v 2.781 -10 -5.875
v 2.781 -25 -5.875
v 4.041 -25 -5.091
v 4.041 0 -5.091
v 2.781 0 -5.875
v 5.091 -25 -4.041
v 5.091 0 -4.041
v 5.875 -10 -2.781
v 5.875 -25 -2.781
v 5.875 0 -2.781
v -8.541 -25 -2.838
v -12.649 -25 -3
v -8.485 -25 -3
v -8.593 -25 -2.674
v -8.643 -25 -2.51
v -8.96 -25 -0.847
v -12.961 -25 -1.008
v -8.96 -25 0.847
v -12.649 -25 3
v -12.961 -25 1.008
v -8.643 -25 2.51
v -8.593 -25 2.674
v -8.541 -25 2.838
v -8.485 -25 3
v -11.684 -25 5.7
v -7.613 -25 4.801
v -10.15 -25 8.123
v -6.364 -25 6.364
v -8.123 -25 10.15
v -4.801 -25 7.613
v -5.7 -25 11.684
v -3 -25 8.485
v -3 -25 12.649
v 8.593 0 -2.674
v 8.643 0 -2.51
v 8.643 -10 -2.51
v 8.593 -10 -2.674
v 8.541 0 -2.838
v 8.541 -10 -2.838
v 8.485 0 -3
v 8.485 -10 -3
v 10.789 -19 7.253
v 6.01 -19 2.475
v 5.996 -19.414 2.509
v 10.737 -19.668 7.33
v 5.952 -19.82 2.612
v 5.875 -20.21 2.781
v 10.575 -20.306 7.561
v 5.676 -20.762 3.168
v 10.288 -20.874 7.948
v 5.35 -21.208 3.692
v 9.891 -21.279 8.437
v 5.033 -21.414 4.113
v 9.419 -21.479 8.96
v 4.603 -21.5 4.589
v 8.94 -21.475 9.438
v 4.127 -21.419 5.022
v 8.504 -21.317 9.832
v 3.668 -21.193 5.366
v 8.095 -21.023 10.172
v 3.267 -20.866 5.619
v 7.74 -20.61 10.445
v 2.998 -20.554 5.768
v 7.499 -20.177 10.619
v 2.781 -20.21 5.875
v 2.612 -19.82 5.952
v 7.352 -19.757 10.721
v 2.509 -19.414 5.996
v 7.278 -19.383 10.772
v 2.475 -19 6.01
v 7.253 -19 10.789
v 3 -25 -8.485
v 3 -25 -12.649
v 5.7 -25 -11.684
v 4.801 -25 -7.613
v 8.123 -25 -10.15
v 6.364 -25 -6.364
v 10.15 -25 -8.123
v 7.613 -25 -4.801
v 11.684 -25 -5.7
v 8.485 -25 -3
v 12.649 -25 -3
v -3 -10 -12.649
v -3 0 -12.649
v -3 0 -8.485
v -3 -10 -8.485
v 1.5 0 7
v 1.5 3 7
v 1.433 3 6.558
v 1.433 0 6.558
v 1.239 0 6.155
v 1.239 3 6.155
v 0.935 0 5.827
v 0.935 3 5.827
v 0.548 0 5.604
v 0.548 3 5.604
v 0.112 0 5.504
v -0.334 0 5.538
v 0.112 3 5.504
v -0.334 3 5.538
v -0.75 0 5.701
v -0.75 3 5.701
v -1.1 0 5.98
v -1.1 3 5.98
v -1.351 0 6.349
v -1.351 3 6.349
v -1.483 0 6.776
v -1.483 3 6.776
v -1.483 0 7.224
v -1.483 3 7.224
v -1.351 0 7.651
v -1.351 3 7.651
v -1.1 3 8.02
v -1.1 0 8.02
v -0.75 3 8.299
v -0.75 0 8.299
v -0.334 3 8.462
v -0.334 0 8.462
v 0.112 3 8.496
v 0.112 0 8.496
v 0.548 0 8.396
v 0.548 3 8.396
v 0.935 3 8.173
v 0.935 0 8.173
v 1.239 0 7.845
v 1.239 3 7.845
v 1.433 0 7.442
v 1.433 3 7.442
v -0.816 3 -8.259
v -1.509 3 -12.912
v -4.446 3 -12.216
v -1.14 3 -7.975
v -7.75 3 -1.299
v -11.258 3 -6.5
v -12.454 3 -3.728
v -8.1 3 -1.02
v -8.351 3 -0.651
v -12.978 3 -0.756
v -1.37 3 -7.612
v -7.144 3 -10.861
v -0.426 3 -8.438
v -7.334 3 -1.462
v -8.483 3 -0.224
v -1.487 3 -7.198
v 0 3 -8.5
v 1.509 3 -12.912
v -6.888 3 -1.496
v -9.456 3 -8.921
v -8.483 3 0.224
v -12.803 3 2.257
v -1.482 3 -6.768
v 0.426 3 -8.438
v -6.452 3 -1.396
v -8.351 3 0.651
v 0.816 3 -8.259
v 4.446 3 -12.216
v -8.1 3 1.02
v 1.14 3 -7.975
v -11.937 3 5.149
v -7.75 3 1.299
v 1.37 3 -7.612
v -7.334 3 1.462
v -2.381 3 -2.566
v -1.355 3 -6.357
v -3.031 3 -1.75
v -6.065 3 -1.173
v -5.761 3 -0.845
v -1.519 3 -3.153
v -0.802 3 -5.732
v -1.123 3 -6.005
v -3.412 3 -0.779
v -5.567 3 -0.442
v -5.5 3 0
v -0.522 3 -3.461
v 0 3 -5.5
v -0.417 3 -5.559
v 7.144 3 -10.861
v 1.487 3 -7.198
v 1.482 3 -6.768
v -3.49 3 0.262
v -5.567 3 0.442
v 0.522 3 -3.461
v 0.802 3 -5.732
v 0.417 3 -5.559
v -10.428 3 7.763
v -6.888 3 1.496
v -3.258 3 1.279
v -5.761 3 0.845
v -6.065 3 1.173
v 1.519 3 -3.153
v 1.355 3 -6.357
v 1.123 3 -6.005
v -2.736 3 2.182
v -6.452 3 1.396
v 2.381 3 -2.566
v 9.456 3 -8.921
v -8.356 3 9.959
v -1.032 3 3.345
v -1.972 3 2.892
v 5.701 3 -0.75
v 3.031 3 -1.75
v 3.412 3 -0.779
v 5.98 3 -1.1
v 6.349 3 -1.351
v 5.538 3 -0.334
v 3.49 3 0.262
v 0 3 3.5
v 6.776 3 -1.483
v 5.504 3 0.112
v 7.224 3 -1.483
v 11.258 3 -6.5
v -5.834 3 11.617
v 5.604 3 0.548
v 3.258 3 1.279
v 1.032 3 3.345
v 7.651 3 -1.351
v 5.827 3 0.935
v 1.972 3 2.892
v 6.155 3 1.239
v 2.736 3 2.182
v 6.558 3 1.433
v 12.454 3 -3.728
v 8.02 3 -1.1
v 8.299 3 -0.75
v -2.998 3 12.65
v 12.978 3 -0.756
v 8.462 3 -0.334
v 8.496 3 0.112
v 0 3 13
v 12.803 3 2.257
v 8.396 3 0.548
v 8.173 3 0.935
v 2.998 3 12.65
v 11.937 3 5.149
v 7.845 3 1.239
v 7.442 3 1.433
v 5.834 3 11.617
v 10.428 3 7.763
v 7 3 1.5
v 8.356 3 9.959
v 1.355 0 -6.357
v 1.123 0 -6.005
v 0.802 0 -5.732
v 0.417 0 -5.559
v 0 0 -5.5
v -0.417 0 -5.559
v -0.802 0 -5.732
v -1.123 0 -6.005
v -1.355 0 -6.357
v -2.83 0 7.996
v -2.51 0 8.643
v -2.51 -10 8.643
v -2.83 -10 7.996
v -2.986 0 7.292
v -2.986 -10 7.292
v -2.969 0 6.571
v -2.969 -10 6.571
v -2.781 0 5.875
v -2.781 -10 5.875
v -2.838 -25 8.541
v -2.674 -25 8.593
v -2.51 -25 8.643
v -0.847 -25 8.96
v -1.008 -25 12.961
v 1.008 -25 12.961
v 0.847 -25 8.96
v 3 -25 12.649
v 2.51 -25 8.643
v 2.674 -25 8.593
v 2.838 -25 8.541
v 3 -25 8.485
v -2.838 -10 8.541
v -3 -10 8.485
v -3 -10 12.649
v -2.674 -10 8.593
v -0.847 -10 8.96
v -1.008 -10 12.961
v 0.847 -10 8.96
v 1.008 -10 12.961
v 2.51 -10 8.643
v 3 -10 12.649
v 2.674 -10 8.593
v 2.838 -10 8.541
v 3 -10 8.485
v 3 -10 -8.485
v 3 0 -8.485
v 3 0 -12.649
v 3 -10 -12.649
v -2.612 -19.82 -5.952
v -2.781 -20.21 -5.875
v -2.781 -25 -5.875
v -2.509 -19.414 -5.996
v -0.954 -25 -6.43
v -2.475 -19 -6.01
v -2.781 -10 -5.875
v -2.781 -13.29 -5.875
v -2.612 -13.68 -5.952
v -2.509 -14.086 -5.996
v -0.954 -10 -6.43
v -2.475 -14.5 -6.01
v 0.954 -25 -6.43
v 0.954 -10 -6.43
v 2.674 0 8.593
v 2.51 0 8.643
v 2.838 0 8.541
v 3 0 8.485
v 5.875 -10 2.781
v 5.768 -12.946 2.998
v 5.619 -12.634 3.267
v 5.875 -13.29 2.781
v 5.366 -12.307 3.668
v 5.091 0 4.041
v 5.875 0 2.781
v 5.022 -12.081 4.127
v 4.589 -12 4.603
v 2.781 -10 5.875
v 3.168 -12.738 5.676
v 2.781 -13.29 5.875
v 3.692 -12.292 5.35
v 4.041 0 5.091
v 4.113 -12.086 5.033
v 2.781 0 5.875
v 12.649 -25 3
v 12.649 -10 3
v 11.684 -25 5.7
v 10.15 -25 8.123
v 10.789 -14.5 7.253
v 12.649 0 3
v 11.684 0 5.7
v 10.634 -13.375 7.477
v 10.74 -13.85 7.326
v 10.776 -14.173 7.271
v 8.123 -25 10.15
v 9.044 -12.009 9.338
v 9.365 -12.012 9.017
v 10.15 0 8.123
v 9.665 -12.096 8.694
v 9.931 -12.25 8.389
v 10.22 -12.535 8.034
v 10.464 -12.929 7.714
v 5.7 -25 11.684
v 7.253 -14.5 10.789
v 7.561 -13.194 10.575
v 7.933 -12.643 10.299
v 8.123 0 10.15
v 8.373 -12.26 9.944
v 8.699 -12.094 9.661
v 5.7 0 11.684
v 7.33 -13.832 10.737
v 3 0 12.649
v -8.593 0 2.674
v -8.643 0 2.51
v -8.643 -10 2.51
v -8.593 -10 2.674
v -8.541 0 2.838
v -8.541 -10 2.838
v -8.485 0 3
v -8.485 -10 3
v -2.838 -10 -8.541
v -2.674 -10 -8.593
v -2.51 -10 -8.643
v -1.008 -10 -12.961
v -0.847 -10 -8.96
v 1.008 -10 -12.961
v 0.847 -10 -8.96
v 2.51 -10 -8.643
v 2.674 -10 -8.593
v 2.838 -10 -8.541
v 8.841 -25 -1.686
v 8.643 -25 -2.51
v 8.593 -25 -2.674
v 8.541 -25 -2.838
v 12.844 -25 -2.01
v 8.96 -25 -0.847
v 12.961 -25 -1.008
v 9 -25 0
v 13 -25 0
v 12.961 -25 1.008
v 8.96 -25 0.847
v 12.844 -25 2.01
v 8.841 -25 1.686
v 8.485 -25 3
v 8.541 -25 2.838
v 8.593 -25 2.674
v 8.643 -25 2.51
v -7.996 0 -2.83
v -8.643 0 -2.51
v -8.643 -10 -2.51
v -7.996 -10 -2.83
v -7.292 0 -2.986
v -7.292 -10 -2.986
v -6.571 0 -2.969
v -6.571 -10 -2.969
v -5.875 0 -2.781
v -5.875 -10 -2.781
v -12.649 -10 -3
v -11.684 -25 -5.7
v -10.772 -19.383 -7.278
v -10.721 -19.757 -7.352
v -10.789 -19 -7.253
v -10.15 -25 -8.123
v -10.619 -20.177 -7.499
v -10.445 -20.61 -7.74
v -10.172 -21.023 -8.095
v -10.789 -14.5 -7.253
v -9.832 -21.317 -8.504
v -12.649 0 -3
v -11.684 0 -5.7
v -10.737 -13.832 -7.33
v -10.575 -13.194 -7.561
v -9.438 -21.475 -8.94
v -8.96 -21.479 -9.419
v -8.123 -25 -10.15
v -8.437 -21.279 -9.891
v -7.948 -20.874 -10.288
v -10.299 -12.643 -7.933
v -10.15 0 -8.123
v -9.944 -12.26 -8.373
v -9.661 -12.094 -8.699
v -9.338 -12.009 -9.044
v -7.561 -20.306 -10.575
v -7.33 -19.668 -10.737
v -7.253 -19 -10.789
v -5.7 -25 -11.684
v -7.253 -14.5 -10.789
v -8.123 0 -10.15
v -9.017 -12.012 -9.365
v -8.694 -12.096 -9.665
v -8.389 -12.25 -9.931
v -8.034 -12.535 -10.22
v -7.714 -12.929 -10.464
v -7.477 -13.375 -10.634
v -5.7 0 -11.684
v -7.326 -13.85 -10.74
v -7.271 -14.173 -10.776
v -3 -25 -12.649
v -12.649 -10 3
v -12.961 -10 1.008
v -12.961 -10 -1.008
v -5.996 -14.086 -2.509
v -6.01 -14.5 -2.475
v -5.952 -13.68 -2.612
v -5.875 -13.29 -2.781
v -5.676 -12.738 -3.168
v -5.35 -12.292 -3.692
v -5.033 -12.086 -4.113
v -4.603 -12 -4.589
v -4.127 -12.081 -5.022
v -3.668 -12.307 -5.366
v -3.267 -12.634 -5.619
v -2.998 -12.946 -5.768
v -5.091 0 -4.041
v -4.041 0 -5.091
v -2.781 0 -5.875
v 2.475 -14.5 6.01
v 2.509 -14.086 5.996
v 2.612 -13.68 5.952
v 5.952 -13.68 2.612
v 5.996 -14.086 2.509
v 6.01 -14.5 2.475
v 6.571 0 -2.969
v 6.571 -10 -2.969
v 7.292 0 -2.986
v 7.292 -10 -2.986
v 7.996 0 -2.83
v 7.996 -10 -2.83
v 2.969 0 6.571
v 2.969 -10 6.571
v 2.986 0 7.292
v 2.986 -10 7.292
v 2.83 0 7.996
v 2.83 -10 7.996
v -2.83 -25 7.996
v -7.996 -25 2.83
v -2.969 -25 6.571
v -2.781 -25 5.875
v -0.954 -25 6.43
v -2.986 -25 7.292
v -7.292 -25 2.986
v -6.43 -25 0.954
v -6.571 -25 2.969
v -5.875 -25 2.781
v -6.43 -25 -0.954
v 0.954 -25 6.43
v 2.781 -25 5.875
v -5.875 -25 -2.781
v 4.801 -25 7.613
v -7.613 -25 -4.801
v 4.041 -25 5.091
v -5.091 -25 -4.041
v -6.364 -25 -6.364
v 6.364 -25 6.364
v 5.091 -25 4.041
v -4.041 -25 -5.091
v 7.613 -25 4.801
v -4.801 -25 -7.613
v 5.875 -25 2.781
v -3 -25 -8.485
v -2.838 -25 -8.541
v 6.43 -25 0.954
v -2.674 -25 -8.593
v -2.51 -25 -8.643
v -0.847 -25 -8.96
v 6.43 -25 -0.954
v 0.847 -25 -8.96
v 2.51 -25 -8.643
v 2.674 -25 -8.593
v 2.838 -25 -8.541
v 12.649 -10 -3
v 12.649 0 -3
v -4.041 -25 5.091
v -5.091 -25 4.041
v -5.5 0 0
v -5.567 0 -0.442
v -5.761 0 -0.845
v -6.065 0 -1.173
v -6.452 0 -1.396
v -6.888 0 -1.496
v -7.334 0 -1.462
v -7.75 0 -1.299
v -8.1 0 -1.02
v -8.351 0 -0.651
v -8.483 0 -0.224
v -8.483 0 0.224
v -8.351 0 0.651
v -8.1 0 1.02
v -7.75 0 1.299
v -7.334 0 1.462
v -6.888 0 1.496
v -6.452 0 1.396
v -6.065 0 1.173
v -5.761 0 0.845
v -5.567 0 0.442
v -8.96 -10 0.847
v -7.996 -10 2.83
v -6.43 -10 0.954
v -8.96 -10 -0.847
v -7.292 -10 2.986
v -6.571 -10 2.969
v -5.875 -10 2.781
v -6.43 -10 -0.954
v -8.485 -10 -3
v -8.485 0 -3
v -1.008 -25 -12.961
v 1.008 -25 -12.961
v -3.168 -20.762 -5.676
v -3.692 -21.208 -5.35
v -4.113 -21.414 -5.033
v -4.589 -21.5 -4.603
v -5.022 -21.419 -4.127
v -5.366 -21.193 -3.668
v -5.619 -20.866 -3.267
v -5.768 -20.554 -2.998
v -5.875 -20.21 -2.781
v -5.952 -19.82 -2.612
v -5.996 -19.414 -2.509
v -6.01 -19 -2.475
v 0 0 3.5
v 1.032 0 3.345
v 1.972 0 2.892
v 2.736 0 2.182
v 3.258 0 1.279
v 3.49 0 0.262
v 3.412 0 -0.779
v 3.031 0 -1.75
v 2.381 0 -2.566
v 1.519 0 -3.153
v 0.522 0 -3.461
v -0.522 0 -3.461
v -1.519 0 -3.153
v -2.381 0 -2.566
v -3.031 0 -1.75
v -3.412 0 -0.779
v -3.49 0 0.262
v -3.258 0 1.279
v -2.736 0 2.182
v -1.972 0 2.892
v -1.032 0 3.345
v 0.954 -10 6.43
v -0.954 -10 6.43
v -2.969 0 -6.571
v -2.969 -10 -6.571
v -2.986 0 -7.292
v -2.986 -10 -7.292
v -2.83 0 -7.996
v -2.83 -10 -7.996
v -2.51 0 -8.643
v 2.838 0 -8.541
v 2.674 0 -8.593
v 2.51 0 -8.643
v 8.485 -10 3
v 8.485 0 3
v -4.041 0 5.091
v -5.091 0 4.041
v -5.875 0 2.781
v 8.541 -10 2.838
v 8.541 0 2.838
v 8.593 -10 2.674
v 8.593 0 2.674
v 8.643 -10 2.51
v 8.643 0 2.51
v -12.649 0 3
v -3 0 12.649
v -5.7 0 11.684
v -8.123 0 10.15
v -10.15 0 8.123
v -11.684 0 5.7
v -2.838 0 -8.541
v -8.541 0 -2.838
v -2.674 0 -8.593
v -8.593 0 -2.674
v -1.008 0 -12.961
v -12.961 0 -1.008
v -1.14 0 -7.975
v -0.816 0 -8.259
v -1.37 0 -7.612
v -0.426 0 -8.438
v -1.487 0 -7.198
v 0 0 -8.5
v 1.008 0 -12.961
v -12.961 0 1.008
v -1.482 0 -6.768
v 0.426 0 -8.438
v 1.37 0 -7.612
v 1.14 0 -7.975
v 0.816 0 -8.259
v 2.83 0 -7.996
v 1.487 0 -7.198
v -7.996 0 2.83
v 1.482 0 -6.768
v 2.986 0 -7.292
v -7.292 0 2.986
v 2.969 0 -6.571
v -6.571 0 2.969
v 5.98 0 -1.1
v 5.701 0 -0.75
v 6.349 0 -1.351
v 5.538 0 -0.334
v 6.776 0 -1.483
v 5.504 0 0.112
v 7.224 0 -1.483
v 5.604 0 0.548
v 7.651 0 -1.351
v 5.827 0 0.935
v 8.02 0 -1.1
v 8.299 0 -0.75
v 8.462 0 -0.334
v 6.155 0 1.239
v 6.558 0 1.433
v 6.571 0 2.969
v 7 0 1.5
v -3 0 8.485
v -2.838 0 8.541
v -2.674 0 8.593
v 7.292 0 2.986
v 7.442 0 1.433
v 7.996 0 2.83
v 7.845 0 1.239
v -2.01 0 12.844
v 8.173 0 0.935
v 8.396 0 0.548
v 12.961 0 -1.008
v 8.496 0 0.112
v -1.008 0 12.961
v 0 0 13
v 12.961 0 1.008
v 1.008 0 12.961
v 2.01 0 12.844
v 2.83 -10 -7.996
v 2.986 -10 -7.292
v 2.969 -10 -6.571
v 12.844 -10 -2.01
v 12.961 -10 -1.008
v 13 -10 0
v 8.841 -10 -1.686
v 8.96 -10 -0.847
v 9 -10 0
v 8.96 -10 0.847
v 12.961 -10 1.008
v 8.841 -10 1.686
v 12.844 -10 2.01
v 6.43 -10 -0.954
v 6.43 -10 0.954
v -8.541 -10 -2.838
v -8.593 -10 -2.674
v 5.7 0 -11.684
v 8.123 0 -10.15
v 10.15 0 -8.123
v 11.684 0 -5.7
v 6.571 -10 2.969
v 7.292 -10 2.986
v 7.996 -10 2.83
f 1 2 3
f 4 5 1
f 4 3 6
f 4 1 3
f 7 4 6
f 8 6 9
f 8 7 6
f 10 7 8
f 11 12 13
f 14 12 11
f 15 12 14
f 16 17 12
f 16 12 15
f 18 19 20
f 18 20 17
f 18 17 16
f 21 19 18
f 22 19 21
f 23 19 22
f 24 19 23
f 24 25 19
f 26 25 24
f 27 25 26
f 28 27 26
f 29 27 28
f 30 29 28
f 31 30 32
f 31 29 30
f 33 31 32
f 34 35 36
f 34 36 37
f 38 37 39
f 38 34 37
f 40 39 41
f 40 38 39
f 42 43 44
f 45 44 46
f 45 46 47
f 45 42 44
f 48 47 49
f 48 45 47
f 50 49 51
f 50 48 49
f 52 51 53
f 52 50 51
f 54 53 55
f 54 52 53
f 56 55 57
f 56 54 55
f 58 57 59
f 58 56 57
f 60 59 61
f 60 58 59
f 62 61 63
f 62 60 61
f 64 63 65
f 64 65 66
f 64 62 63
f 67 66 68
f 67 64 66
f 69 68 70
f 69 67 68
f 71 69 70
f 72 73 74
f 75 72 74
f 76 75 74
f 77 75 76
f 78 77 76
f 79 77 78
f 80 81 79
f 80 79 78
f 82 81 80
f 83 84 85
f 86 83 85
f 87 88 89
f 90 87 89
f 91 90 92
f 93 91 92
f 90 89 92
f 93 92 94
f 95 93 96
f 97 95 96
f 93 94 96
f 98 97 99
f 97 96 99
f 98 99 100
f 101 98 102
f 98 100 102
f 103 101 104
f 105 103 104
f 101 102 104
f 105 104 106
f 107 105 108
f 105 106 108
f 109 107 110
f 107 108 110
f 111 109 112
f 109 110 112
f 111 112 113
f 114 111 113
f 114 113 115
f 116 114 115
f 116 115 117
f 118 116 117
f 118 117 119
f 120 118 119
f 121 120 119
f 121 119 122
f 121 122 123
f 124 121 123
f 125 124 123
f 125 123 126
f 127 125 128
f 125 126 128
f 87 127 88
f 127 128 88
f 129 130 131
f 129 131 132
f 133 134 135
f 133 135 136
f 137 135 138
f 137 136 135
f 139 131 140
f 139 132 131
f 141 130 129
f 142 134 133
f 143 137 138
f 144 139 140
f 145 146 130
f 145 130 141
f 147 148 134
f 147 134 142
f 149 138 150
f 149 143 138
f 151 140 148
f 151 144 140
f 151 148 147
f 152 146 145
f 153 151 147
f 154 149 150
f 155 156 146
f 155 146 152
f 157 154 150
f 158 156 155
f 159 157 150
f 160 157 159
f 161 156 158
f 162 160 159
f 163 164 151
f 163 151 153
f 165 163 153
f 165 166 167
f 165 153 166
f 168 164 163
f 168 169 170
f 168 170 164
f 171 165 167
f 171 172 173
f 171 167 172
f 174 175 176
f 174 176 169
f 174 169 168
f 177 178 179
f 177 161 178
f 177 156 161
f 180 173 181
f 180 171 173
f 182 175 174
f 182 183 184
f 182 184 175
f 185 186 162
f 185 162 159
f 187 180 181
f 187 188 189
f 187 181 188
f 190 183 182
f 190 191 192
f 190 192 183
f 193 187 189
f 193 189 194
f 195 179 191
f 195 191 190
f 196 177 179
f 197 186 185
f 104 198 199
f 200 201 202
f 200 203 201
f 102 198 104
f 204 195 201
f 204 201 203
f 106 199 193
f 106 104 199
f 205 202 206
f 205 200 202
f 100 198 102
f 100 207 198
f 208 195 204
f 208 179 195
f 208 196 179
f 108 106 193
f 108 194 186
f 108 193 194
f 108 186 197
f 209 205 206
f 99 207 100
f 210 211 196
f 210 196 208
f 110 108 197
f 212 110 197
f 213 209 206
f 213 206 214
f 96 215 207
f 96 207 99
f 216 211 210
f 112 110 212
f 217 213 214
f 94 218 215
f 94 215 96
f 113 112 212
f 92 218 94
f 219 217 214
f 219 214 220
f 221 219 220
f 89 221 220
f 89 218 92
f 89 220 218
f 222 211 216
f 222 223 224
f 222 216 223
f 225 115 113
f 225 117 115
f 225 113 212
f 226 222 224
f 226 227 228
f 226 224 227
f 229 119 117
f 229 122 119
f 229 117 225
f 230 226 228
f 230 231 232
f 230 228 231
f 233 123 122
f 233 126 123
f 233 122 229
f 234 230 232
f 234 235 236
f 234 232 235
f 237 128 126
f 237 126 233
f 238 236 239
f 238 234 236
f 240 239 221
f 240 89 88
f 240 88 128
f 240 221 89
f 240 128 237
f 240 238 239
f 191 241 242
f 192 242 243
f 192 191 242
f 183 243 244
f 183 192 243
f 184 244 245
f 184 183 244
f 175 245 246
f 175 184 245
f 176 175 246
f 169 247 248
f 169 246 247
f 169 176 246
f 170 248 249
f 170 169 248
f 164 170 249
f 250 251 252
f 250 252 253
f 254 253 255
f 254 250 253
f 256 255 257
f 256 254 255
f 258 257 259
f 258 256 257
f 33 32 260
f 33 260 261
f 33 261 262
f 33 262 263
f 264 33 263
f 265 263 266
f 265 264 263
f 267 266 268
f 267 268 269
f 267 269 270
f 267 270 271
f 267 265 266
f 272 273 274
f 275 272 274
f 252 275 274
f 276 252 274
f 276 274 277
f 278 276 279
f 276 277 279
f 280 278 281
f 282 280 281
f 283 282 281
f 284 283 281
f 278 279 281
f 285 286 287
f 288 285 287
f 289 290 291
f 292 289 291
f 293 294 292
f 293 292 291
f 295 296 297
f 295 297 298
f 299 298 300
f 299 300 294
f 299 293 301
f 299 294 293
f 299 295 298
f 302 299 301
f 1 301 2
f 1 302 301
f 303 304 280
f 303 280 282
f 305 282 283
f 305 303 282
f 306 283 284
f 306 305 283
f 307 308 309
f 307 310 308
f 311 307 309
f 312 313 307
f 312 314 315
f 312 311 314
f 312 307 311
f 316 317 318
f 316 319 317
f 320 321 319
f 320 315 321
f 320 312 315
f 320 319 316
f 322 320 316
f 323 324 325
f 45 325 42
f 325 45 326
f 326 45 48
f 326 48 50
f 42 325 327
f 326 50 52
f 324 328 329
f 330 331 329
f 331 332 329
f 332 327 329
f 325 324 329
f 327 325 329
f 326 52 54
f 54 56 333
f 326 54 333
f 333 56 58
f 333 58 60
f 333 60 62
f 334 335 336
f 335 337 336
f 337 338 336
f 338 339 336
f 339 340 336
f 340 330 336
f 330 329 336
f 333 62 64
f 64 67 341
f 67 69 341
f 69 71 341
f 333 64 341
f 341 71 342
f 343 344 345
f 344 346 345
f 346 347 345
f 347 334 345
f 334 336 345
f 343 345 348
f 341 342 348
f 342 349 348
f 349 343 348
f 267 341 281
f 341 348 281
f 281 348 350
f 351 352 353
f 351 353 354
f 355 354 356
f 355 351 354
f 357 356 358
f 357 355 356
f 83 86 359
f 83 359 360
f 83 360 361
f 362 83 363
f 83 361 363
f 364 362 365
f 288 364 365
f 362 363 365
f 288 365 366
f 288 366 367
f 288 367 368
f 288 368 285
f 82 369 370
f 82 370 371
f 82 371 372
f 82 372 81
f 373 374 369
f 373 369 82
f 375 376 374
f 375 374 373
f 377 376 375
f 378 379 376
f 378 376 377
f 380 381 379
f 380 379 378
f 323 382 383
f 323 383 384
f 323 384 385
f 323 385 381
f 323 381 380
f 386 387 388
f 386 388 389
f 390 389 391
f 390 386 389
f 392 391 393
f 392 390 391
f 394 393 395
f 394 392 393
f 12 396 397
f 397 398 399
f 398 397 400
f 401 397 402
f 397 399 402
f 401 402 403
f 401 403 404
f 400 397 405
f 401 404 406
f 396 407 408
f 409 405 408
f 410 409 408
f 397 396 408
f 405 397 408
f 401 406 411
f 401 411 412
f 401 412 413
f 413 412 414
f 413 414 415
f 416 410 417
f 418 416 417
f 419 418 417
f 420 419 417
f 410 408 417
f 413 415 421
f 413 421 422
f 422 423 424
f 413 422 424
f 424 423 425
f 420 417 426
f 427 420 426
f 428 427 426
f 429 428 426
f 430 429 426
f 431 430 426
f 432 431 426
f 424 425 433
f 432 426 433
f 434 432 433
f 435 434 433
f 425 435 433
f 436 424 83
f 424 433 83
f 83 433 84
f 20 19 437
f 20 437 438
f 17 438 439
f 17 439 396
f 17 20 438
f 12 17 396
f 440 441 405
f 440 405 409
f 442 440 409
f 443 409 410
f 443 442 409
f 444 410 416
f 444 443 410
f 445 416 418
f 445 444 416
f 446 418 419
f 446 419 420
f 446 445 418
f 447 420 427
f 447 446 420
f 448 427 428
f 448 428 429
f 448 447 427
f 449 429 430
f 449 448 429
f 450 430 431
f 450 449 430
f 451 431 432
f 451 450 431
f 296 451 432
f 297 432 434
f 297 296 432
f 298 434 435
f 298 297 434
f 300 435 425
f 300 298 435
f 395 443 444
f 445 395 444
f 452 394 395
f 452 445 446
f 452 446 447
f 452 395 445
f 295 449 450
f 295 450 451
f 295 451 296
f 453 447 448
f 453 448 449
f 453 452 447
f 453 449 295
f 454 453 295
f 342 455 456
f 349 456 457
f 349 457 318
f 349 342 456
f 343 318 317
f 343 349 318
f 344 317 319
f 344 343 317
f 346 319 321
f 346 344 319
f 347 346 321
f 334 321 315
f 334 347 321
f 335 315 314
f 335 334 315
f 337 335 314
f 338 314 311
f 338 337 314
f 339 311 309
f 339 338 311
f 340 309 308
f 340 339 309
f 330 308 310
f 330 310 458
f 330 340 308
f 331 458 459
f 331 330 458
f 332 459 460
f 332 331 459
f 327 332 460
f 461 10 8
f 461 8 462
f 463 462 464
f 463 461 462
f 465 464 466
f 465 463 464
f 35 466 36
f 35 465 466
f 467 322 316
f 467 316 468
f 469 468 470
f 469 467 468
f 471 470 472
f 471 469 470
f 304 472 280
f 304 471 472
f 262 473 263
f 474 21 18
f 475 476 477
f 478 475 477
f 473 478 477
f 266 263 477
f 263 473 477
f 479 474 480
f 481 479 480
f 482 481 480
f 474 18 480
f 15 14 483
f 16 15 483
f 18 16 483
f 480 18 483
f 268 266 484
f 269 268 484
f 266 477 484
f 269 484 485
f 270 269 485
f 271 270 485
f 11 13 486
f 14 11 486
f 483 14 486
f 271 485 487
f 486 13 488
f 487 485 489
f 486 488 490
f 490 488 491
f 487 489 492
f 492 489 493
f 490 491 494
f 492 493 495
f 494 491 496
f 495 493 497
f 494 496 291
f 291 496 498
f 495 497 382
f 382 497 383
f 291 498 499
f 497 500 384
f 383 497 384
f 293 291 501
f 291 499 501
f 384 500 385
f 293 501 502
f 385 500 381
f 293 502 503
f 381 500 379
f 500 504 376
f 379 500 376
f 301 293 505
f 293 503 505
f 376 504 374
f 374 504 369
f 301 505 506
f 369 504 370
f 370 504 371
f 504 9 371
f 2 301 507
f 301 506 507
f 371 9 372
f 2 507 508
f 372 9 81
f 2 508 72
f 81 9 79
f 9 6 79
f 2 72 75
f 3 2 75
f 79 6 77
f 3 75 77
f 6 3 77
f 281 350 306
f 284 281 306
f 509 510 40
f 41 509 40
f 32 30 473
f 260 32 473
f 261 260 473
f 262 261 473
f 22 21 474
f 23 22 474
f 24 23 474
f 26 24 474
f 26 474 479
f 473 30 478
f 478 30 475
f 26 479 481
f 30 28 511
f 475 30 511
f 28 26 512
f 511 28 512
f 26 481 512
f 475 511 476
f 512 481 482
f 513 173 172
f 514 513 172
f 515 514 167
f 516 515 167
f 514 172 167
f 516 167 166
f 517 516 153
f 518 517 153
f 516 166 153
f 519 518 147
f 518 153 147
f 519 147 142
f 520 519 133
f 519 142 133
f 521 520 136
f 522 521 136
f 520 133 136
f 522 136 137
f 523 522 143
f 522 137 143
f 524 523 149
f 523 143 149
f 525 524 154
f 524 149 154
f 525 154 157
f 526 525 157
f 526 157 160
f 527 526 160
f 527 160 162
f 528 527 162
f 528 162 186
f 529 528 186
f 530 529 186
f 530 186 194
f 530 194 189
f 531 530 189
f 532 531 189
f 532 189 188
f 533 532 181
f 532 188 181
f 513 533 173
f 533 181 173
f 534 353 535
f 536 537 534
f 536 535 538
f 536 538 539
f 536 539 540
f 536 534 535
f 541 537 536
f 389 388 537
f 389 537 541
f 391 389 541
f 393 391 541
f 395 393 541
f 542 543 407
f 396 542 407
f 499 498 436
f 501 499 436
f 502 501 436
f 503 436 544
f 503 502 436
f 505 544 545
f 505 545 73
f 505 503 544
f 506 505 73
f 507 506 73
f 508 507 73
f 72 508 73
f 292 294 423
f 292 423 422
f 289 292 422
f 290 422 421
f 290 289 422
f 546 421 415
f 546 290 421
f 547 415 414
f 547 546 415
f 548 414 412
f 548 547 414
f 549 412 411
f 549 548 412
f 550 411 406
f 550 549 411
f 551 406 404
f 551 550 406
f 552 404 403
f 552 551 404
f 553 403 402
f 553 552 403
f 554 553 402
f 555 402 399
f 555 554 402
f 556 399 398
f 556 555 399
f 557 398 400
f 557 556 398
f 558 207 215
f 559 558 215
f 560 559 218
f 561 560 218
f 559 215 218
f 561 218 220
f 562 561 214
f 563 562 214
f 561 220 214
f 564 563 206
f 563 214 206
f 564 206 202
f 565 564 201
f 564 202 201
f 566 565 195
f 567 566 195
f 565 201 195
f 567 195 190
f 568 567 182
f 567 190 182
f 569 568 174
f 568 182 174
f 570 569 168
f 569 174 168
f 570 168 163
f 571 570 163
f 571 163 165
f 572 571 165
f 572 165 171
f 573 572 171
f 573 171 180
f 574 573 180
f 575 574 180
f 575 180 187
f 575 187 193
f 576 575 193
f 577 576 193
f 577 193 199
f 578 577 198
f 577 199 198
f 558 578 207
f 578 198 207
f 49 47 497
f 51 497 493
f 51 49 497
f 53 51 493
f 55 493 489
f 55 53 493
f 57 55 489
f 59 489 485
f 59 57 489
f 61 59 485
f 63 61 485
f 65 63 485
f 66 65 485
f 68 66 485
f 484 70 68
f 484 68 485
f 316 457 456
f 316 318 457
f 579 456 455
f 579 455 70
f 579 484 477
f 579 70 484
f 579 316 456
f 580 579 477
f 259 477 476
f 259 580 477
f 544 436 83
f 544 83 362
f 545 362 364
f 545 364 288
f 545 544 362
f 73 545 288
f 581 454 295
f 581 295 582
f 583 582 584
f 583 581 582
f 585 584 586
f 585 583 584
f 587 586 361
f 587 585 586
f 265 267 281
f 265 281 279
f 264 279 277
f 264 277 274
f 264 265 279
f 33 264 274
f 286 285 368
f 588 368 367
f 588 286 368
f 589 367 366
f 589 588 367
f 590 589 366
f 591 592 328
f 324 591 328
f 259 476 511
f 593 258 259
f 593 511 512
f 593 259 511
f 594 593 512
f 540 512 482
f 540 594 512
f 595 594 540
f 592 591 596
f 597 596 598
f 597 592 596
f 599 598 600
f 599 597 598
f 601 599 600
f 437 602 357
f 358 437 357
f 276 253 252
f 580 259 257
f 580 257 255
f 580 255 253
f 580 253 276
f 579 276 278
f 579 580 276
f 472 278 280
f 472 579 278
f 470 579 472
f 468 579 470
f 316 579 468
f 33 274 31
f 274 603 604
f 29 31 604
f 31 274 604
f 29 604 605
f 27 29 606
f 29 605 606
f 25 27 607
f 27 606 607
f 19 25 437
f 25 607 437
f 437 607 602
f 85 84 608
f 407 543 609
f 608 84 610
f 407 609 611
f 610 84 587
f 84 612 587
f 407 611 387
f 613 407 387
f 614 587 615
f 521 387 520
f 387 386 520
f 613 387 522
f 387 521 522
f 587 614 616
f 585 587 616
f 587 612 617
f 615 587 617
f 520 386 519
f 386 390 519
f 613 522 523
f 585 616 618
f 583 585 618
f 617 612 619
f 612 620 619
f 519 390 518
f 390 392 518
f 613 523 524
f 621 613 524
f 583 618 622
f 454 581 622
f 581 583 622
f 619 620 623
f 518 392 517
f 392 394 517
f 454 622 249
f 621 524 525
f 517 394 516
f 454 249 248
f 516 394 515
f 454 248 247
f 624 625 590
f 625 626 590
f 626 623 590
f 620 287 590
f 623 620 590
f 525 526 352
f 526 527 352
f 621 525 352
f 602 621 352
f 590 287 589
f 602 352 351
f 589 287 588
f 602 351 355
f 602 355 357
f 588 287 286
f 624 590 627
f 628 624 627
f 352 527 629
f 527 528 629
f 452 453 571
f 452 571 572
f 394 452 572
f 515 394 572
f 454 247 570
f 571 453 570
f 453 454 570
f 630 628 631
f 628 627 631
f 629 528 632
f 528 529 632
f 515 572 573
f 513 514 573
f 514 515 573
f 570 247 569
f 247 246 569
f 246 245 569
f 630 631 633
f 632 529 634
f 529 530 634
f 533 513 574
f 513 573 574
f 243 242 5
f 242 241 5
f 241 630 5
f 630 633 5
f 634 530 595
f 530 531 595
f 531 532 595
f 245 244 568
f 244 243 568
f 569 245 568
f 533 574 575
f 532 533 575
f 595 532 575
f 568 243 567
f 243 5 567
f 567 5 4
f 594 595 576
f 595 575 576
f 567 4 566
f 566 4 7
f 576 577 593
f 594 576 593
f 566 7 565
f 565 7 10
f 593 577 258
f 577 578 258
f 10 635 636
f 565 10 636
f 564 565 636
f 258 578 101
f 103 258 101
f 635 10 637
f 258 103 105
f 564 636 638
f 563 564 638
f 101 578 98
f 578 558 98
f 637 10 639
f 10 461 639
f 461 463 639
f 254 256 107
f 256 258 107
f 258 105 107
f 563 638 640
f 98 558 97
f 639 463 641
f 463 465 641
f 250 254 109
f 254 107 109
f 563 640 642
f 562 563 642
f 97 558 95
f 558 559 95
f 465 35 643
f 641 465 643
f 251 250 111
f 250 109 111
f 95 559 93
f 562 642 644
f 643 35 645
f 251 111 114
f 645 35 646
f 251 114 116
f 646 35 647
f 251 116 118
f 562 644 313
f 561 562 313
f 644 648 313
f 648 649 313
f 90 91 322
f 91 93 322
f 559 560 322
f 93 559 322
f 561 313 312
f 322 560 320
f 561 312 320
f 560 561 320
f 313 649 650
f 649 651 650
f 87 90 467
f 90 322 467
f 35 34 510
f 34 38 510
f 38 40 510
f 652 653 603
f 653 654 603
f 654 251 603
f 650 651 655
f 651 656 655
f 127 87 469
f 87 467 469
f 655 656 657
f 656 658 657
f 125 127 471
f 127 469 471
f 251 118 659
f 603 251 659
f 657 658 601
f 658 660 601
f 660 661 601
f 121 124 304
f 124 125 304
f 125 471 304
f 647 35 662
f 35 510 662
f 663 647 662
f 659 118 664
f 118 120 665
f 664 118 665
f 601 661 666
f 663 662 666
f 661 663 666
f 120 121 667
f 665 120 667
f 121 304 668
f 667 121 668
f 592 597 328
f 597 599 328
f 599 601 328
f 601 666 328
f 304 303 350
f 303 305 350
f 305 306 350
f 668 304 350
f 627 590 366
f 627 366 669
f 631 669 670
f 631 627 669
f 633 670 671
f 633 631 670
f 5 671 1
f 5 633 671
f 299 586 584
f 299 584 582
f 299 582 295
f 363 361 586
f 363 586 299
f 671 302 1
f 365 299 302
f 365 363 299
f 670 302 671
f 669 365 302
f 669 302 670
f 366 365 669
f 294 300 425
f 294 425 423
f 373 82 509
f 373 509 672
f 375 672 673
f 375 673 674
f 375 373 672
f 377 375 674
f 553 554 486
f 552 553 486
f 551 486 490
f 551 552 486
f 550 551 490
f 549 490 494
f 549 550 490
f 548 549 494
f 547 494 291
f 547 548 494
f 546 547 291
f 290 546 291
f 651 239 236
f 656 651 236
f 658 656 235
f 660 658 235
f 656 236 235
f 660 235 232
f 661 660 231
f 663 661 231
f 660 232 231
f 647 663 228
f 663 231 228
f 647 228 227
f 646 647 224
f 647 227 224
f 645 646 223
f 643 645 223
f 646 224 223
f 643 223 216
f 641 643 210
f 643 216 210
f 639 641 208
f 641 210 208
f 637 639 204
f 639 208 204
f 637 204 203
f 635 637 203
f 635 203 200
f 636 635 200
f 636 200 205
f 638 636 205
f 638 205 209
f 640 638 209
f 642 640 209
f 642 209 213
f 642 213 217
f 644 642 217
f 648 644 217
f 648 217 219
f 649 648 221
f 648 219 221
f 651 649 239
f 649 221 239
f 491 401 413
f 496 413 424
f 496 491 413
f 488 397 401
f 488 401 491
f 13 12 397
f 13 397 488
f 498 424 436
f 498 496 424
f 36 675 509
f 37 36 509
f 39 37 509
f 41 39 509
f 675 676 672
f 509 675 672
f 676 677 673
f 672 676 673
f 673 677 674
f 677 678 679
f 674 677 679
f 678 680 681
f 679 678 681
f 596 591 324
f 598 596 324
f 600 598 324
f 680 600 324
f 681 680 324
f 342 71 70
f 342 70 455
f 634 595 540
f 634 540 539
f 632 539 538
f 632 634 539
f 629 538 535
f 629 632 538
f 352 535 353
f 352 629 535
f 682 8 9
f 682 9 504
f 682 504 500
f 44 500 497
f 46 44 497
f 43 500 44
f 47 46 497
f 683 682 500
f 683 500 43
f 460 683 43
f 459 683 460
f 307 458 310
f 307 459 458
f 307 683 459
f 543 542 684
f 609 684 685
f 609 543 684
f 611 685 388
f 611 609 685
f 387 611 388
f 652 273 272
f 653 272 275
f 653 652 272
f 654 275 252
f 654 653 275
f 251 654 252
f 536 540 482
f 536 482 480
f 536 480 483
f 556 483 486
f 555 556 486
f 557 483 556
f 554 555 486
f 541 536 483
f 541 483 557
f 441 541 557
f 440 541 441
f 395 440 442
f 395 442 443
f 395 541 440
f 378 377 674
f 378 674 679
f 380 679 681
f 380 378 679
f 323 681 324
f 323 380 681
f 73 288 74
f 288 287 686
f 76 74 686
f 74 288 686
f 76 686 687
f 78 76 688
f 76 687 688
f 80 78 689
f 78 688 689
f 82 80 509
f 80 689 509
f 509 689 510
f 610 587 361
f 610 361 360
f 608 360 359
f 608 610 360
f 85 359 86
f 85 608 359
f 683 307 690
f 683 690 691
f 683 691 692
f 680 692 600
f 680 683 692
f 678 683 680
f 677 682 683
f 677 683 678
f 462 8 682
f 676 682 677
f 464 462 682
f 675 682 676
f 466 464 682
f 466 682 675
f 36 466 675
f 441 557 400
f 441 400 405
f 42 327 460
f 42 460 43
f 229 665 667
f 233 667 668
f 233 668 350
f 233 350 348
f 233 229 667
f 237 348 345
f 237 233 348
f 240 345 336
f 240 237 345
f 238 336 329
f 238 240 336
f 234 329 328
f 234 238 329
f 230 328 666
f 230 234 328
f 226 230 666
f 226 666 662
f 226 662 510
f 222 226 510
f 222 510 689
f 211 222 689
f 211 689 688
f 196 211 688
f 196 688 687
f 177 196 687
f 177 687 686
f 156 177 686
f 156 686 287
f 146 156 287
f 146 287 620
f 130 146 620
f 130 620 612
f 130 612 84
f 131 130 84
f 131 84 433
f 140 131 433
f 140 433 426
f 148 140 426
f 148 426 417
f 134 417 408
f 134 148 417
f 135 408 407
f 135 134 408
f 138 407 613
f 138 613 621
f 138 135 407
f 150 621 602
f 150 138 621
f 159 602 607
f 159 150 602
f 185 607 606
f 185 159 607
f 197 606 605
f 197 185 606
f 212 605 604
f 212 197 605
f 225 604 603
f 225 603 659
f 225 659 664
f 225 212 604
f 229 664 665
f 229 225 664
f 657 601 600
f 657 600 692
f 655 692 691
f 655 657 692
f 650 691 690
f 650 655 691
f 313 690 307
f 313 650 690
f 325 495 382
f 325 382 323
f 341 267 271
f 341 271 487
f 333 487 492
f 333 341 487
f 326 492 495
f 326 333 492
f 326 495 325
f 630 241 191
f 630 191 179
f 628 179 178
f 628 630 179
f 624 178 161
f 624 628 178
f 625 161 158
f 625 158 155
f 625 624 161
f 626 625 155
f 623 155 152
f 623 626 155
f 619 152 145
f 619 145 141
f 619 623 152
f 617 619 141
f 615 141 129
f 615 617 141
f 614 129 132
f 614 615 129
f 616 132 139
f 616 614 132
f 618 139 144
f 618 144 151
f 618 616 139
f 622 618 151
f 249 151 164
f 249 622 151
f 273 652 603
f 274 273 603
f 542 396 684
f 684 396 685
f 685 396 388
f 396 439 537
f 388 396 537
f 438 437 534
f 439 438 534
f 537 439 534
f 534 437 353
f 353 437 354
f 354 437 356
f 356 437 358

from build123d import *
from build123d.topology import SkipClean

# Parameters (mm, degrees)
BOSS_EXTRUDE2_DEPTH     = 25
BOSS_EXTRUDE2_2_DEPTH   = 25
BOSS_EXTRUDE2_3_DEPTH   = 25
BOSS_EXTRUDE2_4_DEPTH   = 25
BOSS_EXTRUDE3_START     = 3
SKETCH1_4_R             = 13
SKETCH1_4_R_2           = 1.5
SKETCH1_4_R_3           = 3.5
BOSS_EXTRUDE3_DEPTH     = 3
SKETCH1_7_R             = 1.5
CUT_EXTRUDE2_DEPTH      = 3
BOSS_EXTRUDE4_START     = -10
BOSS_EXTRUDE4_DEPTH     = 15
BOSS_EXTRUDE6_DEPTH     = 25
BOSS_EXTRUDE7_DEPTH     = 15
CUT_EXTRUDE1_DEPTH      = 47.121315646
CUT_EXTRUDE1_DEPTH_BACK = 47.121315646


with BuildPart() as part:
    # Sketch1 → Boss-Extrude2 (new body)
    with BuildSketch(Plane(origin=(0, 0, 0), x_dir=(1, 0, 0), z_dir=(0, 1, 0))):
        with BuildLine():
            ThreePointArc((2.781074433, 5.875), (4.596194078, 4.596194078), (5.875, 2.781074433))
            ThreePointArc((5.875, 2.781074433), (7.29221482, 2.985734499), (8.642857143, 2.510183342))
            ThreePointArc((8.642857143, 2.510183342), (6.363961031, 6.363961031), (2.510183342, 8.642857143))
            ThreePointArc((2.510183342, 8.642857143), (2.985734499, 7.29221482), (2.781074433, 5.875))
        make_face()
    extrude(amount=-BOSS_EXTRUDE2_DEPTH)


with BuildPart() as body_2:
    # Sketch1 → Boss-Extrude2 2 (new body)
    with BuildSketch(Plane(origin=(0, 0, 0), x_dir=(1, 0, 0), z_dir=(0, 1, 0))):
        with BuildLine():
            ThreePointArc((8.642857143, -2.510183342), (7.29221482, -2.985734499), (5.875, -2.781074433))
            ThreePointArc((5.875, -2.781074433), (4.596194078, -4.596194078), (2.781074433, -5.875))
            ThreePointArc((2.781074433, -5.875), (2.985734499, -7.29221482), (2.510183342, -8.642857143))
            ThreePointArc((2.510183342, -8.642857143), (6.363961031, -6.363961031), (8.642857143, -2.510183342))
        make_face()
    extrude(amount=-BOSS_EXTRUDE2_2_DEPTH)


    add(part.part)  # Boss-Extrude3 merges part


with BuildPart() as body_3:
    # Sketch1 → Boss-Extrude2 3 (new body)
    with BuildSketch(Plane(origin=(0, 0, 0), x_dir=(1, 0, 0), z_dir=(0, 1, 0))):
        with BuildLine():
            ThreePointArc((-5.875, 2.781074433), (-4.596194078, 4.596194078), (-2.781074433, 5.875))
            ThreePointArc((-2.781074433, 5.875), (-2.985734499, 7.29221482), (-2.510183342, 8.642857143))
            ThreePointArc((-2.510183342, 8.642857143), (-6.363961031, 6.363961031), (-8.642857143, 2.510183342))
            ThreePointArc((-8.642857143, 2.510183342), (-7.29221482, 2.985734499), (-5.875, 2.781074433))
        make_face()
    extrude(amount=-BOSS_EXTRUDE2_3_DEPTH)


with BuildPart() as body_4:
    # Sketch1 → Boss-Extrude2 4 (new body)
    with BuildSketch(Plane(origin=(0, 0, 0), x_dir=(1, 0, 0), z_dir=(0, 1, 0))):
        with BuildLine():
            ThreePointArc((-2.510183342, -8.642857143), (-2.985734499, -7.29221482), (-2.781074433, -5.875))
            ThreePointArc((-2.781074433, -5.875), (-4.596194078, -4.596194078), (-5.875, -2.781074433))
            ThreePointArc((-5.875, -2.781074433), (-7.29221482, -2.985734499), (-8.642857143, -2.510183342))
            ThreePointArc((-8.642857143, -2.510183342), (-6.363961031, -6.363961031), (-2.510183342, -8.642857143))
        make_face()
    extrude(amount=-BOSS_EXTRUDE2_4_DEPTH)


with BuildPart() as body_2_1:
    add(body_2.part)

    add(body_3.part)  # Boss-Extrude3 merges body 3
    # Sketch1<4> → Boss-Extrude3 (add)
    with BuildSketch(Plane(origin=(0, 0, 0), x_dir=(1, 0, 0), z_dir=(0, 1, 0)).offset(BOSS_EXTRUDE3_START)):
        with Locations(Location((0, 0, 0), (0, 0, 270))):
            Circle(SKETCH1_4_R)
        with Locations(Location((7, 0, 0), (0, 0, 270))):
            Circle(SKETCH1_4_R_2, mode=Mode.SUBTRACT)
        with Locations((0, -7)):
            Circle(SKETCH1_4_R_2, mode=Mode.SUBTRACT)
        with Locations((-7, 0)):
            Circle(SKETCH1_4_R_2, mode=Mode.SUBTRACT)
        with Locations(Location((0, 0, 0), (0, 0, 270))):
            Circle(SKETCH1_4_R_3, mode=Mode.SUBTRACT)
        with BuildLine():
            ThreePointArc((1.355261854, 6.357142857), (0, 5.5), (-1.355261854, 6.357142857))
            ThreePointArc((-1.355261854, 6.357142857), (0, 6.5), (1.355261854, 6.357142857))
        make_face(mode=Mode.SUBTRACT)
    extrude(amount=-BOSS_EXTRUDE3_DEPTH)

    # Sketch1<7> → Cut-Extrude2 (cut)
    with BuildSketch(Plane(origin=(0, 0, 0), x_dir=(1, 0, 0), z_dir=(0, 1, 0))):
        with Locations(Location((0, 7, 0), (0, 0, 270))):
            Circle(SKETCH1_7_R)
    extrude(amount=CUT_EXTRUDE2_DEPTH, mode=Mode.SUBTRACT)

    # Sketch1<6> → Boss-Extrude4 (add)
    with BuildSketch(Plane(origin=(0, 0, 0), x_dir=(1, 0, 0), z_dir=(0, 1, 0)).offset(BOSS_EXTRUDE4_START)):
        with BuildLine():
            ThreePointArc((5.875, -2.781074433), (7.29221482, -2.985734499), (8.642857143, -2.510183342))
            ThreePointArc((8.642857143, -2.510183342), (9, 0), (8.642857143, 2.510183342))
            ThreePointArc((8.642857143, 2.510183342), (7.29221482, 2.985734499), (5.875, 2.781074433))
            ThreePointArc((5.875, 2.781074433), (6.5, 0), (5.875, -2.781074433))
        make_face()
        with BuildLine():
            ThreePointArc((2.781074433, 5.875), (2.985734499, 7.29221482), (2.510183342, 8.642857143))
            ThreePointArc((2.510183342, 8.642857143), (0, 9), (-2.510183342, 8.642857143))
            ThreePointArc((-2.510183342, 8.642857143), (-2.985734499, 7.29221482), (-2.781074433, 5.875))
            ThreePointArc((-2.781074433, 5.875), (0, 6.5), (2.781074433, 5.875))
        make_face()
        with BuildLine():
            ThreePointArc((2.510183342, -8.642857143), (2.985734499, -7.29221482), (2.781074433, -5.875))
            ThreePointArc((2.781074433, -5.875), (0, -6.5), (-2.781074433, -5.875))
            ThreePointArc((-2.781074433, -5.875), (-2.985734499, -7.29221482), (-2.510183342, -8.642857143))
            ThreePointArc((-2.510183342, -8.642857143), (0, -9), (2.510183342, -8.642857143))
        make_face()
        with BuildLine():
            ThreePointArc((-5.875, 2.781074433), (-7.29221482, 2.985734499), (-8.642857143, 2.510183342))
            ThreePointArc((-8.642857143, 2.510183342), (-9, 0), (-8.642857143, -2.510183342))
            ThreePointArc((-8.642857143, -2.510183342), (-7.29221482, -2.985734499), (-5.875, -2.781074433))
            ThreePointArc((-5.875, -2.781074433), (-6.5, 0), (-5.875, 2.781074433))
        make_face()
    extrude(amount=-BOSS_EXTRUDE4_DEPTH)


    with SkipClean():  # the faces are left unmerged after this step: merging them gives an invalid solid
        add(body_4.part)  # Boss-Extrude6 merges body 4
        # Sketch3 → Boss-Extrude6 (add)
        with BuildSketch(Plane.XZ):
            with BuildLine():
                Line((-8.485281374, -3), (-12.649110641, -3))
                ThreePointArc((-12.649110641, -3), (-9.192388155, -9.192388155), (-3, -12.649110641))
                Line((-3, -12.649110641), (-3, -8.485281374))
                ThreePointArc((-3, -8.485281374), (-6.363961031, -6.363961031), (-8.485281374, -3))
            make_face()
            with BuildLine():
                ThreePointArc((3, -12.649110641), (9.192388155, -9.192388155), (12.649110641, -3))
                Line((12.649110641, -3), (8.485281374, -3))
                ThreePointArc((8.485281374, -3), (6.363961031, -6.363961031), (3, -8.485281374))
                Line((3, -8.485281374), (3, -12.649110641))
            make_face()
            with BuildLine():
                ThreePointArc((12.649110641, 3), (9.192388155, 9.192388155), (3, 12.649110641))
                Line((3, 12.649110641), (3, 8.485281374))
                ThreePointArc((3, 8.485281374), (6.363961031, 6.363961031), (8.485281374, 3))
                Line((8.485281374, 3), (12.649110641, 3))
            make_face()
            with BuildLine():
                Line((-3, 8.485281374), (-3, 12.649110641))
                ThreePointArc((-3, 12.649110641), (-9.192388155, 9.192388155), (-12.649110641, 3))
                Line((-12.649110641, 3), (-8.485281374, 3))
                ThreePointArc((-8.485281374, 3), (-6.363961031, 6.363961031), (-3, 8.485281374))
            make_face()
        extrude(amount=BOSS_EXTRUDE6_DEPTH)

    # Sketch4 → Boss-Extrude7 (add)
    with SkipClean():  # the faces are left unmerged after this step: merging them gives an invalid solid
        with BuildSketch(Plane.XZ.offset(25)):
            with BuildLine():
                Line((3, -12.649110641), (3, -8.485281374))
                ThreePointArc((3, -8.485281374), (0, -9), (-3, -8.485281374))
                Line((-3, -8.485281374), (-3, -12.649110641))
                ThreePointArc((-3, -12.649110641), (0, -13), (3, -12.649110641))
            make_face()
            with BuildLine():
                ThreePointArc((-8.485281374, -3), (-9, 0), (-8.485281374, 3))
                Line((-8.485281374, 3), (-12.649110641, 3))
                ThreePointArc((-12.649110641, 3), (-13, 0), (-12.649110641, -3))
                Line((-12.649110641, -3), (-8.485281374, -3))
            make_face()
            with BuildLine():
                ThreePointArc((8.485281374, 3), (8.870387037, 1.521917809), (9, 0))
                ThreePointArc((9, 0), (8.870387037, -1.521917809), (8.485281374, -3))
                Line((8.485281374, -3), (12.649110641, -3))
                ThreePointArc((12.649110641, -3), (12.911979676, -1.510225425), (13, 0))
                ThreePointArc((13, 0), (12.911979676, 1.510225425), (12.649110641, 3))
                Line((12.649110641, 3), (8.485281374, 3))
            make_face()
            with BuildLine():
                ThreePointArc((-3, 8.485281374), (0, 9), (3, 8.485281374))
                Line((3, 8.485281374), (3, 12.649110641))
                ThreePointArc((3, 12.649110641), (0, 13), (-3, 12.649110641))
                Line((-3, 12.649110641), (-3, 8.485281374))
            make_face()
        extrude(amount=-BOSS_EXTRUDE7_DEPTH)

    # Sketch2 → Cut-Extrude1 (cut, two sides: drawn at the far end of the back side and taken through both)
    with SkipClean():  # the faces are left unmerged after this step: merging them gives an invalid solid
        with BuildSketch(Plane(origin=(20.02081528, 0, -7.292893219), x_dir=(-0.7071067811865485, 0, 0.7071067811865466), z_dir=(-0.7071067811865466, 0, -0.7071067811865485)).offset(-CUT_EXTRUDE1_DEPTH_BACK)):
            with BuildLine():
                Line((16.813708499, -14.5), (16.813708499, -19))
                ThreePointArc((16.813708499, -19), (19.313708499, -21.5), (21.813708499, -19))
                Line((21.813708499, -19), (21.813708499, -14.5))
                ThreePointArc((21.813708499, -14.5), (19.313708499, -12), (16.813708499, -14.5))
            make_face()
        extrude(amount=CUT_EXTRUDE1_DEPTH + CUT_EXTRUDE1_DEPTH_BACK, mode=Mode.SUBTRACT)


solid = body_2_1.part
